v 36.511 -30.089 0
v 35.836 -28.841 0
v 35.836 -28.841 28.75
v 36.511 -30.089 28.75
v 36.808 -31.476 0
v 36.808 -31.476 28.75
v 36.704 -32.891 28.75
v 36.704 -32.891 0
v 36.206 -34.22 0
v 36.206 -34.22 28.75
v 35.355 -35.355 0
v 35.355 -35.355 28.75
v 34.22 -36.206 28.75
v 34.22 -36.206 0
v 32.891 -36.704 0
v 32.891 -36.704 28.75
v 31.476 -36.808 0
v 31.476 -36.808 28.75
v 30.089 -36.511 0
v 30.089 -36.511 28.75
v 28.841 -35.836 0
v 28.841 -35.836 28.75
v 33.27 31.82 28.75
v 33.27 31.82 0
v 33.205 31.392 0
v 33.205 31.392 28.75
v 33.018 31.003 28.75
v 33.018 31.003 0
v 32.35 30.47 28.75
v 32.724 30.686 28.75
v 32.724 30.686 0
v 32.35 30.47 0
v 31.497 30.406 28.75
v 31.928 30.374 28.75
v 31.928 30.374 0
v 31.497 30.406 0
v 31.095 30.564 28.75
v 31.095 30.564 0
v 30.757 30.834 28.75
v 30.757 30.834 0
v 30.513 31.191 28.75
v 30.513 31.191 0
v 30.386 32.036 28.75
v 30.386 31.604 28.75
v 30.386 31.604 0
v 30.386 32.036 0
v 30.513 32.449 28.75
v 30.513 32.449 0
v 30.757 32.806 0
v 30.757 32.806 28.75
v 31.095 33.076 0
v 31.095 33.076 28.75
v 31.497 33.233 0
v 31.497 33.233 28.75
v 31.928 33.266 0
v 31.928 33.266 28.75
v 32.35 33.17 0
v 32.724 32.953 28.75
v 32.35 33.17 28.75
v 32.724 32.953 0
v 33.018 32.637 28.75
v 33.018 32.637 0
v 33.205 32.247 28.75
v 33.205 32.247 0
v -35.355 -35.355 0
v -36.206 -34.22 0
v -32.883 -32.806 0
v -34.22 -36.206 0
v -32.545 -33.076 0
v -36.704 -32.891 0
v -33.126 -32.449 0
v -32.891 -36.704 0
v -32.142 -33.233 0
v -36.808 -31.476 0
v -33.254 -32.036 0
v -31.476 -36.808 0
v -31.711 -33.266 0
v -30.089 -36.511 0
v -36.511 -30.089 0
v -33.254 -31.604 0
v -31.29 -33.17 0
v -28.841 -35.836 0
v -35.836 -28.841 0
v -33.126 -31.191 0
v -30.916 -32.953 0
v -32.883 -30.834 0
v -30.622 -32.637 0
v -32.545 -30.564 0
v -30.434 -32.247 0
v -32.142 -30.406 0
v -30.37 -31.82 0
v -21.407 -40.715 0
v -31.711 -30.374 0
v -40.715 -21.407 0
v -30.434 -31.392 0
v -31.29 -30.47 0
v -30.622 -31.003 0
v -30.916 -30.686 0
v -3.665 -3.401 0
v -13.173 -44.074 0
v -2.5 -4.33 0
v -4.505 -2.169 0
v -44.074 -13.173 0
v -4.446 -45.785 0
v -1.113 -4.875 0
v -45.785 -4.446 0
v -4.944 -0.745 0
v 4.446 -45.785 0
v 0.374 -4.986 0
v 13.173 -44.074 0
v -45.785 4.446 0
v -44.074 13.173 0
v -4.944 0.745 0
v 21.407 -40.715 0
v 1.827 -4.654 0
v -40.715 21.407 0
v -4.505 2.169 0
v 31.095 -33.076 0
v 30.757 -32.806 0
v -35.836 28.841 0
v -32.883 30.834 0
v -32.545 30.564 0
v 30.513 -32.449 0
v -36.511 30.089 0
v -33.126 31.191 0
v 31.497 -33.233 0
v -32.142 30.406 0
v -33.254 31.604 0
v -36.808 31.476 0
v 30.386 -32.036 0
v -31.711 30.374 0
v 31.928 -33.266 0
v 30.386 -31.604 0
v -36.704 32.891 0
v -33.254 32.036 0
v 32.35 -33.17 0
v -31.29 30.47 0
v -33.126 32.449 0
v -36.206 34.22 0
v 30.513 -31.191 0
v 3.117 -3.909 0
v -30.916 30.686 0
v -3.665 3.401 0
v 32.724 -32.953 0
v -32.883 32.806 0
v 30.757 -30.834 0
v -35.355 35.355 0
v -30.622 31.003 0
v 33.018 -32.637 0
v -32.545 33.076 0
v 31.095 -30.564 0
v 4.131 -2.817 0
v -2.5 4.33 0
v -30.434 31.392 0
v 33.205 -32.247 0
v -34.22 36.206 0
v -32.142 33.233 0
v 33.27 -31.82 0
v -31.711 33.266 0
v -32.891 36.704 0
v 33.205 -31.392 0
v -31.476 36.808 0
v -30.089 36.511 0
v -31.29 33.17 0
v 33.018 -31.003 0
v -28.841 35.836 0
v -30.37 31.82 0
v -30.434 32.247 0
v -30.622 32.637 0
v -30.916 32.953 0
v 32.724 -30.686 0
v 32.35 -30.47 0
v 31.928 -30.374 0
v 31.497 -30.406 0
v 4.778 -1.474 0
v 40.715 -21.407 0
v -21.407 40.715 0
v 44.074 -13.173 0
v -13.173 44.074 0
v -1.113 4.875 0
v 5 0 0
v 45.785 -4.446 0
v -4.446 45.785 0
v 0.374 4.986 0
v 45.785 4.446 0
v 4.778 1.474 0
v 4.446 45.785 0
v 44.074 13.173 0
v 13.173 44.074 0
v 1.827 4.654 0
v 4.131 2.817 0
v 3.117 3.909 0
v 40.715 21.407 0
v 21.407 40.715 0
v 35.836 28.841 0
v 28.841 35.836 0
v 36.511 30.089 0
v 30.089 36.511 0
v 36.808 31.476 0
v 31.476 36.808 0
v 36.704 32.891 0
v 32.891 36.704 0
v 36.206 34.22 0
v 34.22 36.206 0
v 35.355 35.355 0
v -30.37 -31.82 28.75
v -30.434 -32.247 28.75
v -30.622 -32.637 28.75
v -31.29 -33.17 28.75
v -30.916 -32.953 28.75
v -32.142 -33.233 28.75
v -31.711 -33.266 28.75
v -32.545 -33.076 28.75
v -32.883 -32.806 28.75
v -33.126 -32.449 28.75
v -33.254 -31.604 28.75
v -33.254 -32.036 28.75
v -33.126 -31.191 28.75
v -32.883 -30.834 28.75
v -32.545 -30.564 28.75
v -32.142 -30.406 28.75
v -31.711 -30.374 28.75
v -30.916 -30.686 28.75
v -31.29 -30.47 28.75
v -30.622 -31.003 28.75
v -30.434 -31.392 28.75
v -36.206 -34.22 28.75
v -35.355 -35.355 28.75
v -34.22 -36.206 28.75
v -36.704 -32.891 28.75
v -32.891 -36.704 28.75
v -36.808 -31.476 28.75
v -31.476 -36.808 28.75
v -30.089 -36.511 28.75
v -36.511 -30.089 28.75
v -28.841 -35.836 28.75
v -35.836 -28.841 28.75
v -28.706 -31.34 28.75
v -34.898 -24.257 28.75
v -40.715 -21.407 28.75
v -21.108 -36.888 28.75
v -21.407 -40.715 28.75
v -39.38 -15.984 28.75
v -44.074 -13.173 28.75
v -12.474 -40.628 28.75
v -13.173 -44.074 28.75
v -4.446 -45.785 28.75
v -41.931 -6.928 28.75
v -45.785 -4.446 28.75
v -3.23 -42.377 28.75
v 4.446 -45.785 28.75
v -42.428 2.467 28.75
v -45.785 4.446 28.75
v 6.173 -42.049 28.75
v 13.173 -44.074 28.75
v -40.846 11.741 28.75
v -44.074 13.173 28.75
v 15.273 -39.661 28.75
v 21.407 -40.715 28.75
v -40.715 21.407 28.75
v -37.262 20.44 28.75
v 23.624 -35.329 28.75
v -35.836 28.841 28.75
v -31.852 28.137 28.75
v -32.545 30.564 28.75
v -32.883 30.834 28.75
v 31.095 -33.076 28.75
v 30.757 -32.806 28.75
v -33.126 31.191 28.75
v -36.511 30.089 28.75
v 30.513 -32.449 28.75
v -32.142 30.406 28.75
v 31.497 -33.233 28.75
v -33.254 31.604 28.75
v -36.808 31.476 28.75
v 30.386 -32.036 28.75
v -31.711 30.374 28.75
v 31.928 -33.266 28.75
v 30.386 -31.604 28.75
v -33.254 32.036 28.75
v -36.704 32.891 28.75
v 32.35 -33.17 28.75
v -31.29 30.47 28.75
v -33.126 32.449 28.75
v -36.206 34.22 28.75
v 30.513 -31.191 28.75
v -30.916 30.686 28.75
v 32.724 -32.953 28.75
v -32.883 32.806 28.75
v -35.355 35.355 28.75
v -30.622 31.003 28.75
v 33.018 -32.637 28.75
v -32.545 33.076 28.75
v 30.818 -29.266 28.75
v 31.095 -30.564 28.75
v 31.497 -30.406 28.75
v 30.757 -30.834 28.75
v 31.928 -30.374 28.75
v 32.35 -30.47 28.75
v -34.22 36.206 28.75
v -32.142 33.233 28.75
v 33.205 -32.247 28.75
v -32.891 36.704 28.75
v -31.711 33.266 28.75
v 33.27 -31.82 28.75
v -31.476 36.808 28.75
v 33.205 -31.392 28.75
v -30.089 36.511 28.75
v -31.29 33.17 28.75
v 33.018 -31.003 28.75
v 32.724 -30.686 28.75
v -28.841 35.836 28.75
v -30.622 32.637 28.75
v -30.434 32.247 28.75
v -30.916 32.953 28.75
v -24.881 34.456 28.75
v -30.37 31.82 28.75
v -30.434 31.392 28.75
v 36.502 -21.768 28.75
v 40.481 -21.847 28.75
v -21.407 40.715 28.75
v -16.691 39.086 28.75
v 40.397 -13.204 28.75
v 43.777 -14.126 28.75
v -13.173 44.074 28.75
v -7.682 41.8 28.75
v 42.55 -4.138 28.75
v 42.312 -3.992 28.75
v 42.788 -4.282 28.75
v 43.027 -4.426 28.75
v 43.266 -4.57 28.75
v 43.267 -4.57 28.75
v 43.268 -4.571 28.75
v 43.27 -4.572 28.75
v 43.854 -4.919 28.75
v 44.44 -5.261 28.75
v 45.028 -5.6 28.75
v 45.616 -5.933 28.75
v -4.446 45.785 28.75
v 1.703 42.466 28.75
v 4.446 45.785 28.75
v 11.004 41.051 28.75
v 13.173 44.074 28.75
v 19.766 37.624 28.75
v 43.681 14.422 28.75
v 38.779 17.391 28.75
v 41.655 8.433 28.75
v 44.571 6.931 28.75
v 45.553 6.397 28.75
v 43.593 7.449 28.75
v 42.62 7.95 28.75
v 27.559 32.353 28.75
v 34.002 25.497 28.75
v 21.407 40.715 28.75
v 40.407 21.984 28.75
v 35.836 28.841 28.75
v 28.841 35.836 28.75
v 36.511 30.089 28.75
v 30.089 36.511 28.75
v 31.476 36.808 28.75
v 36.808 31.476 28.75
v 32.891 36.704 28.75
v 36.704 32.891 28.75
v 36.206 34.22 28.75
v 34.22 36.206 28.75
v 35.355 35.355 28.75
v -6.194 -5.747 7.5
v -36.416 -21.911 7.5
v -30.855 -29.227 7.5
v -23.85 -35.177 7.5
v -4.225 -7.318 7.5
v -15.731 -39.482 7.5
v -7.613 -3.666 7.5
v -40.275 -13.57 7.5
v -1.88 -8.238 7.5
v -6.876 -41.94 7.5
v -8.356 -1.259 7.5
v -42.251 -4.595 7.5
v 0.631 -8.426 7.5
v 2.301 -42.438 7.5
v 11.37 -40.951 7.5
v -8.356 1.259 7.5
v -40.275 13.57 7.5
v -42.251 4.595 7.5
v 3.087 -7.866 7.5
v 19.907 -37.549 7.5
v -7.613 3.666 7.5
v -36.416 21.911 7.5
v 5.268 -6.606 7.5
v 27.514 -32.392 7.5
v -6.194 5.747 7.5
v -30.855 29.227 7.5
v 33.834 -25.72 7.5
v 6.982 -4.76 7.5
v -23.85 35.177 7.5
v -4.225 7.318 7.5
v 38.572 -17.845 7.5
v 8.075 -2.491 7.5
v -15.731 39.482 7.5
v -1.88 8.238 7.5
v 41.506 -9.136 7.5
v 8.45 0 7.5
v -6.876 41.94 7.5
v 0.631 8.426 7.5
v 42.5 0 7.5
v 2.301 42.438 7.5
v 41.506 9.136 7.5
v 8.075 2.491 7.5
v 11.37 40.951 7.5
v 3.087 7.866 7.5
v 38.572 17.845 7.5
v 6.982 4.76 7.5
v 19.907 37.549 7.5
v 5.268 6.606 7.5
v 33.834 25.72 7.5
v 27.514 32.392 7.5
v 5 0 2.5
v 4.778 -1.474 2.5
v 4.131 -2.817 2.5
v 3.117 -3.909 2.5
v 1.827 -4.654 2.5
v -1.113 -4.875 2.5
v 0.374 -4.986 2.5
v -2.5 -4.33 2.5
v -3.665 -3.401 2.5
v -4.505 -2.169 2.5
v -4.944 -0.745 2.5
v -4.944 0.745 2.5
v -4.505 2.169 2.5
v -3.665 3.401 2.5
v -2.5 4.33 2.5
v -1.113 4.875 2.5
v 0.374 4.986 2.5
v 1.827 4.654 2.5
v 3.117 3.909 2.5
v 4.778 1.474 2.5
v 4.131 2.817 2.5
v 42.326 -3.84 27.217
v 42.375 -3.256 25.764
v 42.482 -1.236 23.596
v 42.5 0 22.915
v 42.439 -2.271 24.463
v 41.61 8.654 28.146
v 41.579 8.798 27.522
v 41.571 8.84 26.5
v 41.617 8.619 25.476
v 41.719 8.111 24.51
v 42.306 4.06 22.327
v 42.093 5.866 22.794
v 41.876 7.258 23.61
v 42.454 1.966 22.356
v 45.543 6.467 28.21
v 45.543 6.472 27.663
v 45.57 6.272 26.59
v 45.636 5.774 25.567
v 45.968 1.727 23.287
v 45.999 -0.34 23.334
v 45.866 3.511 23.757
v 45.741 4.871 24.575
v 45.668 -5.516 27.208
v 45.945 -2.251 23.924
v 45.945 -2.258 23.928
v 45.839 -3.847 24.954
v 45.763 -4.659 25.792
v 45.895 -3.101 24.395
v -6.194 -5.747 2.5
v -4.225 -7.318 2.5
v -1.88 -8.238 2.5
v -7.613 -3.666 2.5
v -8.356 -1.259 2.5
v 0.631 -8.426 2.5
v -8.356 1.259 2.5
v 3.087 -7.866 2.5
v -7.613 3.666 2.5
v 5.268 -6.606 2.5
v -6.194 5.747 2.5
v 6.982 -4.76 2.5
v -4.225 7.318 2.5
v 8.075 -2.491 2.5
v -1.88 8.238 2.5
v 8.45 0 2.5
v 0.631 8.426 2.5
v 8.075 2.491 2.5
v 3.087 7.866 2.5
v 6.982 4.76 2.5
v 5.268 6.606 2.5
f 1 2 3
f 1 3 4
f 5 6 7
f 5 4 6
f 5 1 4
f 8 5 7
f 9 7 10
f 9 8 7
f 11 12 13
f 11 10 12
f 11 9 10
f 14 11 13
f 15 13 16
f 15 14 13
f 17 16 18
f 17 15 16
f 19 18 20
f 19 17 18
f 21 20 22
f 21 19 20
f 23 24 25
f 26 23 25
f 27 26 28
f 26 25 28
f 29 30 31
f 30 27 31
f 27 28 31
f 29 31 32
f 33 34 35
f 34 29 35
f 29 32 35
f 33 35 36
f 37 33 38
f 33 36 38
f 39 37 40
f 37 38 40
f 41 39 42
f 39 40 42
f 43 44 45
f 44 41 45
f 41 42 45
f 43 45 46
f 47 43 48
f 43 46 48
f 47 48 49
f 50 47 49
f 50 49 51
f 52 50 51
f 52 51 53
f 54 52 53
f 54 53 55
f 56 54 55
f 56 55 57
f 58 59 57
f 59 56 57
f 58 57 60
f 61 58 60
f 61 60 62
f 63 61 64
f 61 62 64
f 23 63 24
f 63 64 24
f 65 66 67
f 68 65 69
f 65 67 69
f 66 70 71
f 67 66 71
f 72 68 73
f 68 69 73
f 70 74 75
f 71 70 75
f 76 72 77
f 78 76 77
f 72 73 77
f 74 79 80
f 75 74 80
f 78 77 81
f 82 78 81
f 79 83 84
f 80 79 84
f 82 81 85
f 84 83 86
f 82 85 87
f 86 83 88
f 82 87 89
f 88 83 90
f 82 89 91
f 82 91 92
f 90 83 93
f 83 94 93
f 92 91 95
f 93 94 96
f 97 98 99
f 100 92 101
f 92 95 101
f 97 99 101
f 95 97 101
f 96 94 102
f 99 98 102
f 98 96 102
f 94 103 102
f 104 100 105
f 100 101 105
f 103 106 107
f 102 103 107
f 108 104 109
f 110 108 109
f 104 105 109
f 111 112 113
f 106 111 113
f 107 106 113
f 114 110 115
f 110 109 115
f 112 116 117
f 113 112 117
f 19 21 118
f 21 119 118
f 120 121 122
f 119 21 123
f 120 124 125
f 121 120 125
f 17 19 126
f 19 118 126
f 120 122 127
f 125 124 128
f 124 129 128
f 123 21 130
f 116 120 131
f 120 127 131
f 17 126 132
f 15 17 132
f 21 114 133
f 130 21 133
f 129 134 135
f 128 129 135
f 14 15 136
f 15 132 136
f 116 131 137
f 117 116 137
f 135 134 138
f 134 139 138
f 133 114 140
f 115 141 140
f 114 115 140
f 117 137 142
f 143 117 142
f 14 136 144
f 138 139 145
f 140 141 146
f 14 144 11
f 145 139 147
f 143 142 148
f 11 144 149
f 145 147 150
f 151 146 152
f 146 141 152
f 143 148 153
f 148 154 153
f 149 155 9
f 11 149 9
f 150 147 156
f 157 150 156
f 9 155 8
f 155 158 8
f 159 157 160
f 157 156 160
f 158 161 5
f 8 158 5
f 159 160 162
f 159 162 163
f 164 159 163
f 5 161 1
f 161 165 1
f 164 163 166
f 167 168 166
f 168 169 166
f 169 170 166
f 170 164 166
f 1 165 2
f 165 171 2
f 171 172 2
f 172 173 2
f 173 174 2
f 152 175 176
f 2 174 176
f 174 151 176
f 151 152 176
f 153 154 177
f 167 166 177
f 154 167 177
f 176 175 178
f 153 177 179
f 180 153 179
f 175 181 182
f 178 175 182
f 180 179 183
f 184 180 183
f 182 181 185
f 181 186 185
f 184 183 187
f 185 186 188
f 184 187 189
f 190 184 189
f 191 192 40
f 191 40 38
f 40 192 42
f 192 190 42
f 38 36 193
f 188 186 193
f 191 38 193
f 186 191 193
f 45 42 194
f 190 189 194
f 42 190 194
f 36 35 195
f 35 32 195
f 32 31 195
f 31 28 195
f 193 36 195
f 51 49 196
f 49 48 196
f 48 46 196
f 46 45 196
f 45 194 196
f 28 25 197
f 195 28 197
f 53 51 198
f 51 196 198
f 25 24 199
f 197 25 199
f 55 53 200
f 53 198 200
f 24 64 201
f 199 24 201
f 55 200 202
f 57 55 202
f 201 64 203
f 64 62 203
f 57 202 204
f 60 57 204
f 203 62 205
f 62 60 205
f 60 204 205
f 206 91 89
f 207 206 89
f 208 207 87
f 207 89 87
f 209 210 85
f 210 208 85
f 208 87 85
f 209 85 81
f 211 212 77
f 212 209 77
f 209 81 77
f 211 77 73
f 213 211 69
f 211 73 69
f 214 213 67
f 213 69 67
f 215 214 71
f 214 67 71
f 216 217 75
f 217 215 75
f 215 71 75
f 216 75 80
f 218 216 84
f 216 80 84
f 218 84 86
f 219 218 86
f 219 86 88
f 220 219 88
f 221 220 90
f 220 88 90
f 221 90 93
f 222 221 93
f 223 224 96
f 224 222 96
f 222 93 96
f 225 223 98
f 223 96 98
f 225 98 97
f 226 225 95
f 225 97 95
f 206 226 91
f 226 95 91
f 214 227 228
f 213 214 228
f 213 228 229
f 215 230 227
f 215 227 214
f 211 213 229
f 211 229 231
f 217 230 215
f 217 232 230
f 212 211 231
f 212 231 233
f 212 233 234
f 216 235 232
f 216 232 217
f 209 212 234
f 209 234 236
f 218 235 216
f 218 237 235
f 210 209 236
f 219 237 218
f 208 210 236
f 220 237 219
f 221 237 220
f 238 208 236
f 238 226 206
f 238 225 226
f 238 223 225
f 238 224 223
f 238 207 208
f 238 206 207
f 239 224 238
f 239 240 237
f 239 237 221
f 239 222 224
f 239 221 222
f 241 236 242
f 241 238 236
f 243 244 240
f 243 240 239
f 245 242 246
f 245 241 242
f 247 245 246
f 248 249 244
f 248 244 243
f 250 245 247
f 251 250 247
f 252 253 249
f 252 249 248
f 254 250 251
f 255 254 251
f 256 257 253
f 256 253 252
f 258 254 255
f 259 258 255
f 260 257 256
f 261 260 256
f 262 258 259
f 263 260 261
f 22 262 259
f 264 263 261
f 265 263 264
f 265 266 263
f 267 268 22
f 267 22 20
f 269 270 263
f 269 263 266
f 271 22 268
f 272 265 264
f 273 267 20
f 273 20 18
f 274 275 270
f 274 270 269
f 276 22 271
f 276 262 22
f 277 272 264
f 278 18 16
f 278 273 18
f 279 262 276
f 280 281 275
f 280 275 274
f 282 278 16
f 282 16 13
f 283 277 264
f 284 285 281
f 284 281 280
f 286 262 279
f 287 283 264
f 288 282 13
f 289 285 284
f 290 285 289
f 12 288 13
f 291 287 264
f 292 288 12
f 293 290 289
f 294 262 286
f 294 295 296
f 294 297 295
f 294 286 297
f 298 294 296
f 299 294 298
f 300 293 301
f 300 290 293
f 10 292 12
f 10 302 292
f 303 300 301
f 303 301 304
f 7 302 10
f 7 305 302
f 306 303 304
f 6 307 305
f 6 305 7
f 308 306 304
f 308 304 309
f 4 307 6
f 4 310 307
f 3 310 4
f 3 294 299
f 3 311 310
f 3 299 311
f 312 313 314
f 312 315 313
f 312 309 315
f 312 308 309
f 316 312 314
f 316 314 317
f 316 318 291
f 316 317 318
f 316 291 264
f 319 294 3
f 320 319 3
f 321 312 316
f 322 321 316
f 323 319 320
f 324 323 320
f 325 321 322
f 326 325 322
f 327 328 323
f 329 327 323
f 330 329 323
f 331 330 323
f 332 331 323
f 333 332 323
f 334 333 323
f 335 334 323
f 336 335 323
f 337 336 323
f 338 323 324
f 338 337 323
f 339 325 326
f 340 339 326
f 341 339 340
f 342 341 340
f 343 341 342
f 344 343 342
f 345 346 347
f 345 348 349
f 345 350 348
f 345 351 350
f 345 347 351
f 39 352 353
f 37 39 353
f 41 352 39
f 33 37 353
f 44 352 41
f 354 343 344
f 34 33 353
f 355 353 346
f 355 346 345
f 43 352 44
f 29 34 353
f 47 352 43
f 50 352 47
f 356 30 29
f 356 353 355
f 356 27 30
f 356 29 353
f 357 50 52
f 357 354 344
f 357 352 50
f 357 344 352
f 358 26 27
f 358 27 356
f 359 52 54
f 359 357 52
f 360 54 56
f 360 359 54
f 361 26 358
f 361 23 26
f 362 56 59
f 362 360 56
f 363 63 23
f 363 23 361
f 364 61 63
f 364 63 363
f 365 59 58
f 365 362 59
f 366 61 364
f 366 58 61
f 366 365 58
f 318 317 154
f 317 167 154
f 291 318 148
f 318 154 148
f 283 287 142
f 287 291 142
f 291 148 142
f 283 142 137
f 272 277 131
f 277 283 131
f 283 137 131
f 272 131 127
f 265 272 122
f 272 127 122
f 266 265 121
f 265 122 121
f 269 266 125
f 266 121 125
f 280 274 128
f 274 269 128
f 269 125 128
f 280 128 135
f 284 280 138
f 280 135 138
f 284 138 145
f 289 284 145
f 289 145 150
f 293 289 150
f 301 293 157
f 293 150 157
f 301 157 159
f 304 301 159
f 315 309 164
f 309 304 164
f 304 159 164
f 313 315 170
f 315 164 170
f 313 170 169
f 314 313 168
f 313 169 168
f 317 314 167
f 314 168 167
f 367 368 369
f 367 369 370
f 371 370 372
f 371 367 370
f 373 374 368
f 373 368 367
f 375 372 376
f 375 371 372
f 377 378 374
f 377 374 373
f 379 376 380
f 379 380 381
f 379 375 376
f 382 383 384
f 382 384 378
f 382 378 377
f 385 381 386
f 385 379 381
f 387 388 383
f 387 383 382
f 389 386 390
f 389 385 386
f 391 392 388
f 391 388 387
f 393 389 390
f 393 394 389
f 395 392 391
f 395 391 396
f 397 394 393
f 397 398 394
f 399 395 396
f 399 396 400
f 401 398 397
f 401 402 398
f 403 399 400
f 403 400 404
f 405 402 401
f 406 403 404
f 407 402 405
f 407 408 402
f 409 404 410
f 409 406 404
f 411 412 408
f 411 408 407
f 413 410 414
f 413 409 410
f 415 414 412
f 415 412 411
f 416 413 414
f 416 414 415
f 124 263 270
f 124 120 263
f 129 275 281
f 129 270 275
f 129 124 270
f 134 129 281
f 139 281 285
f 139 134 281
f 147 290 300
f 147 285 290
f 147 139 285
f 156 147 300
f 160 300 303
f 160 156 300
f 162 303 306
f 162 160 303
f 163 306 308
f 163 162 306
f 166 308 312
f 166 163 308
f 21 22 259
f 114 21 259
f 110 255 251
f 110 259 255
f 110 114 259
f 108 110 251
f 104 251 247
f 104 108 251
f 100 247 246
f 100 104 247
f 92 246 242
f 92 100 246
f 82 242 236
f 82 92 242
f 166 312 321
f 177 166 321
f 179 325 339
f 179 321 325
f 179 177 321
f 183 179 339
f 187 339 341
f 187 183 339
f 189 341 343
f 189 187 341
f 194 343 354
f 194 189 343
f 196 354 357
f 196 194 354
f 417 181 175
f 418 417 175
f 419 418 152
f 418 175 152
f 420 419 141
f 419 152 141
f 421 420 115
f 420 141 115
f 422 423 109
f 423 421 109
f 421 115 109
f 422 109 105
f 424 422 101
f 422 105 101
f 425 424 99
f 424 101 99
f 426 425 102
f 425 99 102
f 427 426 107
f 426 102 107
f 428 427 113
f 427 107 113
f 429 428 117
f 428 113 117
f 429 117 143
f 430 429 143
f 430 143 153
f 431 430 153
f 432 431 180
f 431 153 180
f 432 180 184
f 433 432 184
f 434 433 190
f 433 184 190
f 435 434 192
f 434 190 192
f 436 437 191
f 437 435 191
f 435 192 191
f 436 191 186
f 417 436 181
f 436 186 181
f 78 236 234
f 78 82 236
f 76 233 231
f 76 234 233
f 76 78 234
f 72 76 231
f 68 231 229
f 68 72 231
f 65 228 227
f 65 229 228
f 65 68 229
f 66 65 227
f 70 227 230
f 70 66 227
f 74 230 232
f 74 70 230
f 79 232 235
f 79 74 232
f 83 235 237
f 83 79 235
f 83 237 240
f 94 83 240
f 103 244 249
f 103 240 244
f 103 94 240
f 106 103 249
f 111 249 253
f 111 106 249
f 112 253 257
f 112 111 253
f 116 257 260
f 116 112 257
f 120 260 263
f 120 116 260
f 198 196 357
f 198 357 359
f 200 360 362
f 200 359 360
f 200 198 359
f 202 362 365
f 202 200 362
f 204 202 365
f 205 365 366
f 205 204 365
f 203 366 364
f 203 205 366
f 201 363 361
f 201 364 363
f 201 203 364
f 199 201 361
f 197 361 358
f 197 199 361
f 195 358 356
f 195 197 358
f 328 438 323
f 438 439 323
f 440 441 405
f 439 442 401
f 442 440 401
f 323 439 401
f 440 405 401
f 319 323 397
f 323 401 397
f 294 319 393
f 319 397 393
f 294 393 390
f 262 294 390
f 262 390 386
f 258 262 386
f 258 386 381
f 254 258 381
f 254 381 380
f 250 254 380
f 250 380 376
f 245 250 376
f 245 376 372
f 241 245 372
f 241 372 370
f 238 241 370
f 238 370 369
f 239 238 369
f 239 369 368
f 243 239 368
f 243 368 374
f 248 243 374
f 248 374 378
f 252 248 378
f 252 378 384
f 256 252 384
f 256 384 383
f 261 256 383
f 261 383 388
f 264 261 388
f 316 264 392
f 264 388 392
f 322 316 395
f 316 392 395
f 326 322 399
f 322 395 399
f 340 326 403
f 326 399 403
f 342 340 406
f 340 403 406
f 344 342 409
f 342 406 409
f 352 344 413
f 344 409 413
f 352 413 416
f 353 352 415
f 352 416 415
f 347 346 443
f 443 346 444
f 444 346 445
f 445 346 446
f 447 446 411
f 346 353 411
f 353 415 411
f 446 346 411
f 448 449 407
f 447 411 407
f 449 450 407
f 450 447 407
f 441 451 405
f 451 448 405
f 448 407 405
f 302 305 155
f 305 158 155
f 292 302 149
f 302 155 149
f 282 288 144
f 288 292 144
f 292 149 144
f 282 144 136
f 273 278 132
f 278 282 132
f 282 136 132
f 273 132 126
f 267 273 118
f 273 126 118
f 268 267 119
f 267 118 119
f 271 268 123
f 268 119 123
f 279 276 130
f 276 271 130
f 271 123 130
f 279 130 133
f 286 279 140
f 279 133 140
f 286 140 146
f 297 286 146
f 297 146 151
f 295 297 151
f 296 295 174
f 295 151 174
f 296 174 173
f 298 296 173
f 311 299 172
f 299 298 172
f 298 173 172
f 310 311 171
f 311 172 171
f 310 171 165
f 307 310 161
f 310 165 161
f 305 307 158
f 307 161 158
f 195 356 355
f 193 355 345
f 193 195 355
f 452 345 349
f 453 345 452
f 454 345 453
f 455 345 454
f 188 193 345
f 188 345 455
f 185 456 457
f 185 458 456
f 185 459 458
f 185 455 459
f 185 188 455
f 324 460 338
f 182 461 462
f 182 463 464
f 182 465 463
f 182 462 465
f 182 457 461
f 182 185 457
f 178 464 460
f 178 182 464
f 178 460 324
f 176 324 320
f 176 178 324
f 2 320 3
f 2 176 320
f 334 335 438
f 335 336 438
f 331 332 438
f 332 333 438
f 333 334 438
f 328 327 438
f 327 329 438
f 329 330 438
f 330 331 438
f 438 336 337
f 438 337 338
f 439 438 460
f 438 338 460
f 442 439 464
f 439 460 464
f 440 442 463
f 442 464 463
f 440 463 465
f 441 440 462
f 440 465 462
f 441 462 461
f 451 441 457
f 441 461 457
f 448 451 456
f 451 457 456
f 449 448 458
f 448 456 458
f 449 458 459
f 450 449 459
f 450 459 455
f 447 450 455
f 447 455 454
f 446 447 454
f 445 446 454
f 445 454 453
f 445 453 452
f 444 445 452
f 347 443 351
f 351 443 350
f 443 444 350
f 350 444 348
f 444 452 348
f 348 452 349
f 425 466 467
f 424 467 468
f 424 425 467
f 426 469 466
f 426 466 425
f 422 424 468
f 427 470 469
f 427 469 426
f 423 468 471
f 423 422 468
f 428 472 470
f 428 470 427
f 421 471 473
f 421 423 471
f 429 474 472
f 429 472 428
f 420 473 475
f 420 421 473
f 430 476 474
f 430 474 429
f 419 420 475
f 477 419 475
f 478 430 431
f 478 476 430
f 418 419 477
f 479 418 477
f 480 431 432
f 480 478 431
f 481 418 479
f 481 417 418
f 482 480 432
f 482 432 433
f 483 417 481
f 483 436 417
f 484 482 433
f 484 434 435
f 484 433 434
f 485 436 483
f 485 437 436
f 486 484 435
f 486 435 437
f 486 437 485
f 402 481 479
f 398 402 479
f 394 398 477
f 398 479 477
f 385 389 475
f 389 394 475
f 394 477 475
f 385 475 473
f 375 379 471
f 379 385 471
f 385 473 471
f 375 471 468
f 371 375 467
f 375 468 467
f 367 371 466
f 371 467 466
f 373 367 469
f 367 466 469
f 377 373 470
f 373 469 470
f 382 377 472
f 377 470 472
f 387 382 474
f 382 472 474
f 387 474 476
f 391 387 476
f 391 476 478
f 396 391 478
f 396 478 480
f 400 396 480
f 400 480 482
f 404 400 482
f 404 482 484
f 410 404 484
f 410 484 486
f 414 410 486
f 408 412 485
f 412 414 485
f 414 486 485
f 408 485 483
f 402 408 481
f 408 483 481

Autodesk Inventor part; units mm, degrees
ref_plane "YZ Plane" through (0, 0, 0) normal (1, 0, 0) x (0, 1, 0)
ref_plane "XZ Plane" through (0, 0, 0) normal (0, 1, 0) x (-1, 0, 0)
sketch "Sketch1" plane through (0, 0, 0) normal (0, 0, 1) x (1, 0, 0)
  circle A0 centre (0, 0) radius 5
  circle A1 centre (0, 0) radius 8.45
  circle A2 centre (0, 0) radius 42.5
  circle A3 centre (0, 0) radius 45 construction
  circle A4 centre (-31.8198, 31.8198) radius 1.45
  arc A5 (-28.0933, 35.1535) -> (-35.1535, 28.0933) centre (-31.8198, 31.8198) ccw
  arc A6 (-35.1535, -28.0933) -> (-28.0933, -35.1535) centre (-31.8198, -31.8198) ccw
  circle A7 centre (-31.8198, -31.8198) radius 1.45
  arc A8 (28.0933, -35.1535) -> (35.1535, -28.0933) centre (31.8198, -31.8198) ccw
  circle A9 centre (31.8198, -31.8198) radius 1.45
  arc A10 (35.1535, 28.0933) -> (28.0933, 35.1535) centre (31.8198, 31.8198) ccw
  circle A11 centre (31.8198, 31.8198) radius 1.45
  line L0 (-31.8198, 31.8198) -> (31.8198, 31.8198) construction
  arc A12 (28.841, 35.8357) -> (-28.841, 35.8357) centre (0, 0) ccw
  arc A13 (-35.8357, 28.841) -> (-35.8357, -28.841) centre (0, 0) ccw
  arc A14 (-28.841, -35.8357) -> (28.841, -35.8357) centre (0, 0) ccw
  arc A15 (35.8357, -28.841) -> (35.8357, 28.841) centre (0, 0) ccw
  point P0 (0, -46)
  point P1 (0, 46)
  dimension "d2" = 10
  dimension "d3" = 16.9
  dimension "d4" = 85
  dimension "d5" = 90
  dimension "d6" = 2.9
  dimension "d7" = 5
  dimension "d8" = 360
  dimension "d9" = 92
extrude "Extrusion1" add sketch "Sketch1" along normal blind 2.5 contours A1
extrude "Extrusion2" add sketch "Sketch1" along normal blind 7.5 contours A2
extrude "Extrusion3" add sketch "Sketch1" along normal blind 28.75 contours A12 A10 A15 A8 A14 A6 A13 A5
sketch "Sketch2" plane through (0, 0, 28.75) normal (0, 0, 1) x (1, 0, 0)
  arc A0 (35.8357, -28.841) -> (35.8357, 28.841) centre (0, 0) ccw construction
  line L0 (46, 0) -> (46, -31.8198) construction
  point P0 (31.8198, -31.8198)
ref_plane "Work Plane1" through (46, 0, 28.75) normal (0.9659, 0, 0.2588) x (0, -1, 0)
sketch "Sketch3" plane through (46, 0, 28.75) normal (0.9659, 0, 0.2588) x (0, -1, 0)
  ellipse E0 centre (0, -11.9057) end of major axis (-46, -11.9057) minor radius 11.9057 (28.841, -2.6307) -> (-28.841, -2.6307) ccw projected
  line L0 (0, 0) -> (0, -11.9057) construction
  point P0 (0, 15.8647)
ref_plane "Work Plane2" through (46, 0, 28.75) normal (0.8365, -0.5, 0.2241) x (-0.2588, 0, 0.9659)
sketch "Sketch4" plane through (46, 0, 28.75) normal (0.8365, -0.5, 0.2241) x (-0.2588, 0, 0.9659)
  circle A0 centre (0, 0) radius 5.325
  point P0 (-15.8647, 25.9368)
  dimension "d18" = 10.65
extrude "Extrusion4" cut sketch "Sketch4" along normal mid plane 30
properties part number "Case Part 1 - V2"
